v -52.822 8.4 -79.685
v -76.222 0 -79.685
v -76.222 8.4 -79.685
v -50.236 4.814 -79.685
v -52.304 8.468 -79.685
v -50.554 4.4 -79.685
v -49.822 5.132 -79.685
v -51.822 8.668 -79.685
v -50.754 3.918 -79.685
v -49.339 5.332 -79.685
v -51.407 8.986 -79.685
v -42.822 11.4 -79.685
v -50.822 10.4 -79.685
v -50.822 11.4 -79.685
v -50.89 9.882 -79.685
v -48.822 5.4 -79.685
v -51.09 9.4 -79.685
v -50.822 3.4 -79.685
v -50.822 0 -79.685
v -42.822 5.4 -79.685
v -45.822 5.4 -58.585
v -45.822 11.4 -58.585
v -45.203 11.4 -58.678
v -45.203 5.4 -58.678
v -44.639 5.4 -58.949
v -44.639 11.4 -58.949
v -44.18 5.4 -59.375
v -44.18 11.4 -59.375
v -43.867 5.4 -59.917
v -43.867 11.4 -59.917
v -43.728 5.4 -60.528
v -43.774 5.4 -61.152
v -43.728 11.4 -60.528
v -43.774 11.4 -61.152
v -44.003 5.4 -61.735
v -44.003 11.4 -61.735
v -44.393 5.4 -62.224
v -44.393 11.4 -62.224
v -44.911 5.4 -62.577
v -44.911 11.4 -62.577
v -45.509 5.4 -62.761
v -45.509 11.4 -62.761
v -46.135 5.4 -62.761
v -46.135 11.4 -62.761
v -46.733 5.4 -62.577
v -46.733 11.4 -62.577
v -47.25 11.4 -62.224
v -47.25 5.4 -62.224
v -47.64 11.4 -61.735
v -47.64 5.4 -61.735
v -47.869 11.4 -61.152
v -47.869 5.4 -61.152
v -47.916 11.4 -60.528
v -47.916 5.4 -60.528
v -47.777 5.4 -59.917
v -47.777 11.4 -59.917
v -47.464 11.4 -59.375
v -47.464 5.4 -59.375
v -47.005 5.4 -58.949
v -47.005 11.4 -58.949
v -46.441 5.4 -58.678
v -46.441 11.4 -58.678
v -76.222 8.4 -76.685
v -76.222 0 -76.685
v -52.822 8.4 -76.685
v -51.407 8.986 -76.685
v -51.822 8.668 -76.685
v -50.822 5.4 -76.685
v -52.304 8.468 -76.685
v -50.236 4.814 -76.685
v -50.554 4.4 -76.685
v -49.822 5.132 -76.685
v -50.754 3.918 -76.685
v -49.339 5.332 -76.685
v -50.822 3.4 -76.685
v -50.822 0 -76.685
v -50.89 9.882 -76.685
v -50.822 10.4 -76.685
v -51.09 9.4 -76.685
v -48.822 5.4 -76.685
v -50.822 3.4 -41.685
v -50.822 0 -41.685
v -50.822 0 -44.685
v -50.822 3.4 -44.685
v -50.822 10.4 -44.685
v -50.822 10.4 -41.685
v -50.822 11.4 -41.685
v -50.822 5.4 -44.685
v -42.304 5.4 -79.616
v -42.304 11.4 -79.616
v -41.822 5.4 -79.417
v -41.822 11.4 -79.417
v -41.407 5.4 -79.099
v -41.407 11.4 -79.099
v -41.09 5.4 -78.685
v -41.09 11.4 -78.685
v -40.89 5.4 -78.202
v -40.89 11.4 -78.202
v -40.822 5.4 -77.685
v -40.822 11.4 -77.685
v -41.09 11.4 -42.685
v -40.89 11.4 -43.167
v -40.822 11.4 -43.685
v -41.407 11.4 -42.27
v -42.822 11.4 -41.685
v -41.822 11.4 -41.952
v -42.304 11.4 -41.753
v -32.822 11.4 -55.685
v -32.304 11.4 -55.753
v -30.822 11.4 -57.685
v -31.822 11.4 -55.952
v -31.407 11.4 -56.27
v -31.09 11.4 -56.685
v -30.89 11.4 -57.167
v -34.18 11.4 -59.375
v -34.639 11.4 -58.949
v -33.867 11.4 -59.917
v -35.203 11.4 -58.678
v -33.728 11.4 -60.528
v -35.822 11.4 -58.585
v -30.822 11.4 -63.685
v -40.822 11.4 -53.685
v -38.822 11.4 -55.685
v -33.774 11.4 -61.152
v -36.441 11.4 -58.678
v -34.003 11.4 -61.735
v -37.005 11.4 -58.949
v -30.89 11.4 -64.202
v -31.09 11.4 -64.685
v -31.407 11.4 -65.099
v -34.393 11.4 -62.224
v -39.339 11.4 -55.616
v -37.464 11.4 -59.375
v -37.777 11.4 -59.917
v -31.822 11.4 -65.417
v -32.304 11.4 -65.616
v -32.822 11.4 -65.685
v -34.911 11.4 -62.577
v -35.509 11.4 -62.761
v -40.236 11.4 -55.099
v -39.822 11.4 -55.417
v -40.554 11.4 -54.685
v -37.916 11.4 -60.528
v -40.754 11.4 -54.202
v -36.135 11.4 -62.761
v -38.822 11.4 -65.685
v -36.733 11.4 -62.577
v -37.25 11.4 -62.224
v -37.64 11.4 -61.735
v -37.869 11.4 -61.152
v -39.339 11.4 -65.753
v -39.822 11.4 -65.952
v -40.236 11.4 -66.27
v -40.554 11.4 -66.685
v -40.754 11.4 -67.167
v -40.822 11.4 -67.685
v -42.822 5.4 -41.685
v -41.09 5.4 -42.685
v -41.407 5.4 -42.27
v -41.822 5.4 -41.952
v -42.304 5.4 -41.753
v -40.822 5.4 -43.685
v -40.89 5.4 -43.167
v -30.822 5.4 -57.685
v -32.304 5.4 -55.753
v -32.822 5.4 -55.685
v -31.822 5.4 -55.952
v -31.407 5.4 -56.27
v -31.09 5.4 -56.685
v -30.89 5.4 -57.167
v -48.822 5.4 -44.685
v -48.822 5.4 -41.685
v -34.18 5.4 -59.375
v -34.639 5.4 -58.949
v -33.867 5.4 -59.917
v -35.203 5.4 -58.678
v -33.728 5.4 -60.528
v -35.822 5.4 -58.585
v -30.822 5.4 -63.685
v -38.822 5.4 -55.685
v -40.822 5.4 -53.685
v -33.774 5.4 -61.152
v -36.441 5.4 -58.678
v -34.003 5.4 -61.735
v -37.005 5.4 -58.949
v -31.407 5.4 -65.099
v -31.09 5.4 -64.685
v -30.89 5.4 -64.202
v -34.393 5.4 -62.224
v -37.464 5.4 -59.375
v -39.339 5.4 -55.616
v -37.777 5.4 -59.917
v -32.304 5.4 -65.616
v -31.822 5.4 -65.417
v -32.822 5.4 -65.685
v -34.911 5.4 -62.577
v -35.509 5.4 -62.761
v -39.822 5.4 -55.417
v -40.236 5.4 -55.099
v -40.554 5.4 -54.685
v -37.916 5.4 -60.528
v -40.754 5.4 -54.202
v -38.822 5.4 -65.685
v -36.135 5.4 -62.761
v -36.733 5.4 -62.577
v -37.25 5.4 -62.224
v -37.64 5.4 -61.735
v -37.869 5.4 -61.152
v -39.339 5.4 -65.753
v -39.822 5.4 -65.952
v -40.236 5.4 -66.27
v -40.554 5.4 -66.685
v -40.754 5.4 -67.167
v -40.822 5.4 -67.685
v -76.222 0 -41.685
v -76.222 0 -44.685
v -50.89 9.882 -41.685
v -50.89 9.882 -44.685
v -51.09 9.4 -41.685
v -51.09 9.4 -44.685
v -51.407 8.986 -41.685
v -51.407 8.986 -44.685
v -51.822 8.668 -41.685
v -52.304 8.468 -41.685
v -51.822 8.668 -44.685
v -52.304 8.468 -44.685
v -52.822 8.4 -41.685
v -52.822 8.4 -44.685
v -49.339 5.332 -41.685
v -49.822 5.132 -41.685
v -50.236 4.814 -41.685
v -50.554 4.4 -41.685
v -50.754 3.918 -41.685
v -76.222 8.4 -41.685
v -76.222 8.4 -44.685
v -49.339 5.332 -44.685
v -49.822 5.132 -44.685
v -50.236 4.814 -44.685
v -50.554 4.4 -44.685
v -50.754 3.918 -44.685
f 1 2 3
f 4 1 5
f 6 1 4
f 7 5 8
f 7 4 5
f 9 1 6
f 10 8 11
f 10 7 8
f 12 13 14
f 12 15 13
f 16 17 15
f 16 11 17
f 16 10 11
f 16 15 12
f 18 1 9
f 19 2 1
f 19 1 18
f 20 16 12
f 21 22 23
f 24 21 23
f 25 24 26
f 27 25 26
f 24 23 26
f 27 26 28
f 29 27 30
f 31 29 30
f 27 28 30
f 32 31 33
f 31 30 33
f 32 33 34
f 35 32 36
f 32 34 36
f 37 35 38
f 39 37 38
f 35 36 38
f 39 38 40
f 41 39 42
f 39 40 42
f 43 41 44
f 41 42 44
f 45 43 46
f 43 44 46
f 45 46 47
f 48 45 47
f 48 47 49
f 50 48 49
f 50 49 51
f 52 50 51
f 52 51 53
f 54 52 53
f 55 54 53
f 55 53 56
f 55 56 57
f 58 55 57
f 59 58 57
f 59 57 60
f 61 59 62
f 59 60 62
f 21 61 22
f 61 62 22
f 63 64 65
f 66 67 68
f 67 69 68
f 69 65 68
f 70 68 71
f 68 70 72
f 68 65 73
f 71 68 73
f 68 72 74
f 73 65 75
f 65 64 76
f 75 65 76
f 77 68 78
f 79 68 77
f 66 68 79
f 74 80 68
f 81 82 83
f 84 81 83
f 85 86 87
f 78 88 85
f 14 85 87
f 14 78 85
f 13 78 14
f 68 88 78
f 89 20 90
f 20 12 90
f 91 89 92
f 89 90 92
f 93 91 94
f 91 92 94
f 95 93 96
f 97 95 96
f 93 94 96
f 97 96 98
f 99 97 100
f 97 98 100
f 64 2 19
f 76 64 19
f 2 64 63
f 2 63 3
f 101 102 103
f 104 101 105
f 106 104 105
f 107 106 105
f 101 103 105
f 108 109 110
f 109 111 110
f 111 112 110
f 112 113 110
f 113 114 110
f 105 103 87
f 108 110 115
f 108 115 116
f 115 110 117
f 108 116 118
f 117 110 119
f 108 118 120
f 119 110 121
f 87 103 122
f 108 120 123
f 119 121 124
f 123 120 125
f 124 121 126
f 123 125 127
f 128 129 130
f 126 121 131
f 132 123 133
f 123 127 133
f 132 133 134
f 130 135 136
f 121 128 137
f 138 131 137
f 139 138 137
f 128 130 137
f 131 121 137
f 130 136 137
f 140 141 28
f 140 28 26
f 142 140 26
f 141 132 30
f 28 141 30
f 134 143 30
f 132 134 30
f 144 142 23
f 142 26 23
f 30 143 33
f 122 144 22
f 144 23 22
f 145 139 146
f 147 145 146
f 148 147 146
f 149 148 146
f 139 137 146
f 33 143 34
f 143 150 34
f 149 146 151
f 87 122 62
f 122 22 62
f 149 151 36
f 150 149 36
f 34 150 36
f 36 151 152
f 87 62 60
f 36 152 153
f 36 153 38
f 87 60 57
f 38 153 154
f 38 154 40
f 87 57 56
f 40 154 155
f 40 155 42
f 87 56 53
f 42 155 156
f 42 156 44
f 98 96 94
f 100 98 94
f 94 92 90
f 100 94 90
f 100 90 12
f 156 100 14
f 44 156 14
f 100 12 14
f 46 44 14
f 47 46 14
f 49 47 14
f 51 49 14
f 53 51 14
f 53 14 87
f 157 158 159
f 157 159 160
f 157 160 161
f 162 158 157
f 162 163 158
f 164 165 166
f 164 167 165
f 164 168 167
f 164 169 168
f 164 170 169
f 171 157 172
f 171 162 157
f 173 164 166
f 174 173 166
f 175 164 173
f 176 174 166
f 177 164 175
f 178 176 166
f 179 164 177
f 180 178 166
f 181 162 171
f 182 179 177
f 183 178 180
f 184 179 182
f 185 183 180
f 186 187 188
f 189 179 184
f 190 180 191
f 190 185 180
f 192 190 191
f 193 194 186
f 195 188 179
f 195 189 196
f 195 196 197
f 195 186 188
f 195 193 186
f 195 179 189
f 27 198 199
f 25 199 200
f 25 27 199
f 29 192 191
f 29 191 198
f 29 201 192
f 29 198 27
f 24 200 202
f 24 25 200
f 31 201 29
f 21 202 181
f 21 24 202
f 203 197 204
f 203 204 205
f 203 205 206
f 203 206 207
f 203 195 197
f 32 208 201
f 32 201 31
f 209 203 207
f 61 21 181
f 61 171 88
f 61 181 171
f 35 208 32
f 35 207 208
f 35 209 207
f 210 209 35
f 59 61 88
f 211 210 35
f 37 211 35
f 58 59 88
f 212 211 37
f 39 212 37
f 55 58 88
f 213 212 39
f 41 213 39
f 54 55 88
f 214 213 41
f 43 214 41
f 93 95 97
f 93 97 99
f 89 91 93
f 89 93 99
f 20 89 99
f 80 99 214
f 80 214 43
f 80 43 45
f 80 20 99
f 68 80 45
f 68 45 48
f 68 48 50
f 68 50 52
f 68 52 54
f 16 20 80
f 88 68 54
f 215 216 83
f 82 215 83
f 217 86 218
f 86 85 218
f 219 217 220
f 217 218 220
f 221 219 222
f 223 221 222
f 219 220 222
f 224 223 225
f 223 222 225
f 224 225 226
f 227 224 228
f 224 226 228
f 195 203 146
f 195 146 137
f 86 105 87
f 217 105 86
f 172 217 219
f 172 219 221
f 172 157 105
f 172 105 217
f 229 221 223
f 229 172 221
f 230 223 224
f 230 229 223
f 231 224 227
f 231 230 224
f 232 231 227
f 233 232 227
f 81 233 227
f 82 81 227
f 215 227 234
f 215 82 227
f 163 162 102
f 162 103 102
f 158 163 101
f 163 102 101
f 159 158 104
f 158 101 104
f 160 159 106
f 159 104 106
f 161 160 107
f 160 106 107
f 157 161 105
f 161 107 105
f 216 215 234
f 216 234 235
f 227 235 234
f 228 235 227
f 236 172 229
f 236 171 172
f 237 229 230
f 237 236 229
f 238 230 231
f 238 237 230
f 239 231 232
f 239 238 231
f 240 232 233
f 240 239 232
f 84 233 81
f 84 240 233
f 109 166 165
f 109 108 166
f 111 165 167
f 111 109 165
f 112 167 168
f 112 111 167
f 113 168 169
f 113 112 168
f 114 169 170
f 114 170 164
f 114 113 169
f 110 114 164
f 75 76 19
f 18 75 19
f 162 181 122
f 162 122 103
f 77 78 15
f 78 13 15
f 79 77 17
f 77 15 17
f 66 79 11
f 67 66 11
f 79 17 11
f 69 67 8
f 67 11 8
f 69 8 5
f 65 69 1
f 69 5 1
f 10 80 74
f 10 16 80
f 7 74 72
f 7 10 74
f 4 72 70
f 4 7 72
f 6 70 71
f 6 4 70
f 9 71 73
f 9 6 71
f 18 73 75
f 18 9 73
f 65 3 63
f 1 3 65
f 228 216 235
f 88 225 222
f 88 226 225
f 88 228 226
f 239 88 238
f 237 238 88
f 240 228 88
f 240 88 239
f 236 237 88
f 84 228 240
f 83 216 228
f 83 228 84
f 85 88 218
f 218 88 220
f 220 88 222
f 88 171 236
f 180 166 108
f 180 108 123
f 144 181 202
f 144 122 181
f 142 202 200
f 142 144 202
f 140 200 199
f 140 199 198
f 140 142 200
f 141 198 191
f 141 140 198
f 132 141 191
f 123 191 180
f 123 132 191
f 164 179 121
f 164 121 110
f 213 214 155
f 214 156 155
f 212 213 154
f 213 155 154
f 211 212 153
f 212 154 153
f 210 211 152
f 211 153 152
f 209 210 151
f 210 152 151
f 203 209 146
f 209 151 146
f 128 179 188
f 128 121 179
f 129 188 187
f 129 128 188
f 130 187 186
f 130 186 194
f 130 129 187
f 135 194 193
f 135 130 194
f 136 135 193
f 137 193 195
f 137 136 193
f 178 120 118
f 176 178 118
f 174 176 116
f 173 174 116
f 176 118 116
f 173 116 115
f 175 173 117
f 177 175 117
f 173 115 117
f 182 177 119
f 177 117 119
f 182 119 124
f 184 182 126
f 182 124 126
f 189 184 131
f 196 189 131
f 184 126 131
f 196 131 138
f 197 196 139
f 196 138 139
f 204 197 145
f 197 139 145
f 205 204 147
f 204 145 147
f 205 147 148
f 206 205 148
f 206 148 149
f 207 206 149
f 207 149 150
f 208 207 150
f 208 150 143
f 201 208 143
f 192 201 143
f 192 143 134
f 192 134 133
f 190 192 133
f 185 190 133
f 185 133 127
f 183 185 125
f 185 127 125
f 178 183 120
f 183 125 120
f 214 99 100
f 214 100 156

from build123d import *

# Parameters (mm, degrees)
SKETCH_1_W           = 25.4
SKETCH_1_H           = 3
EXTRUDE_1_DEPTH      = 8.4
EXTRUDE_1_2_DEPTH    = 8.4
EXTRUDE_2_DEPTH      = 3
EXTRUDE_2_DEPTH_BACK = 3
FILLET_1_R           = 2
SKETCH_3_R           = 2.1
CUT_EXTRUDE_1_DEPTH  = 6


with BuildPart() as part:
    # 草图1 → 凸台-拉伸1 (new body)
    with BuildSketch(Plane(origin=(0, 0, 0), x_dir=(1, 0, 0), z_dir=(0, 1, 0))):
        with Locations((-63.521674557, 78.184540652)):
            Rectangle(SKETCH_1_W, SKETCH_1_H)
    extrude(amount=EXTRUDE_1_DEPTH)



with BuildPart() as body_2:
    # 草图1 → Extrude 1 2 (new body)
    with BuildSketch(Plane(origin=(0, 0, 0), x_dir=(1, 0, 0), z_dir=(0, 1, 0))):
        with Locations((-63.521674557, 43.184540652)):
            Rectangle(SKETCH_1_W, SKETCH_1_H)
    extrude(amount=EXTRUDE_1_2_DEPTH)


with BuildPart() as part_1:
    add(part.part)

    add(body_2.part)  # 凸台-拉伸2 merges body 2
    # 草图2 → 凸台-拉伸2 (add, two sides: drawn at the far end of the back side and taken through both)
    with BuildSketch(Plane(origin=(0, 8.4, 0), x_dir=(1, 0, 0), z_dir=(0, 1, 0)).offset(-EXTRUDE_2_DEPTH_BACK)):
        Polygon((-40.821674557, 55.684540652), (-40.821674557, 41.684540652), (-50.821674557, 41.684540652), (-50.821674557, 79.684540652), (-40.821674557, 79.684540652), (-40.821674557, 65.684540652), (-30.821674557, 65.684540652), (-30.821674557, 55.684540652), align=None)
    extrude(amount=EXTRUDE_2_DEPTH + EXTRUDE_2_DEPTH_BACK)

    # 圆角1
    fillet_1_edges = [part_1.edges().sort_by_distance(p)[0] for p in [
        (-50.821674557, 8.4, -78.184540652),
        (-50.821674557, 5.4, -78.184540652),
        (-40.821674557, 8.4, -79.684540652),
        (-40.821674557, 8.4, -65.684540652),
        (-30.821674557, 8.4, -65.684540652),
        (-30.821674557, 8.4, -55.684540652),
        (-40.821674557, 8.4, -55.684540652),
        (-40.821674557, 8.4, -41.684540652),
        (-50.821674557, 5.4, -43.184540652),
        (-50.821674557, 8.4, -43.184540652),
    ]]
    fillet(fillet_1_edges, radius=FILLET_1_R)

    # 草图3 → 切除-拉伸1 (cut)
    with BuildSketch(Plane(origin=(0, 11.4, 0), x_dir=(1, 0, 0), z_dir=(0, 1, 0))):
        with Locations(Location((-45.821674557, 60.684540652, 0), (0, 0, 270))):
            Circle(SKETCH_3_R)
        with Locations(Location((-35.821674557, 60.684540652, 0), (0, 0, 270))):
            Circle(SKETCH_3_R)
    extrude(amount=-CUT_EXTRUDE_1_DEPTH, mode=Mode.SUBTRACT)


solid = part_1.part
